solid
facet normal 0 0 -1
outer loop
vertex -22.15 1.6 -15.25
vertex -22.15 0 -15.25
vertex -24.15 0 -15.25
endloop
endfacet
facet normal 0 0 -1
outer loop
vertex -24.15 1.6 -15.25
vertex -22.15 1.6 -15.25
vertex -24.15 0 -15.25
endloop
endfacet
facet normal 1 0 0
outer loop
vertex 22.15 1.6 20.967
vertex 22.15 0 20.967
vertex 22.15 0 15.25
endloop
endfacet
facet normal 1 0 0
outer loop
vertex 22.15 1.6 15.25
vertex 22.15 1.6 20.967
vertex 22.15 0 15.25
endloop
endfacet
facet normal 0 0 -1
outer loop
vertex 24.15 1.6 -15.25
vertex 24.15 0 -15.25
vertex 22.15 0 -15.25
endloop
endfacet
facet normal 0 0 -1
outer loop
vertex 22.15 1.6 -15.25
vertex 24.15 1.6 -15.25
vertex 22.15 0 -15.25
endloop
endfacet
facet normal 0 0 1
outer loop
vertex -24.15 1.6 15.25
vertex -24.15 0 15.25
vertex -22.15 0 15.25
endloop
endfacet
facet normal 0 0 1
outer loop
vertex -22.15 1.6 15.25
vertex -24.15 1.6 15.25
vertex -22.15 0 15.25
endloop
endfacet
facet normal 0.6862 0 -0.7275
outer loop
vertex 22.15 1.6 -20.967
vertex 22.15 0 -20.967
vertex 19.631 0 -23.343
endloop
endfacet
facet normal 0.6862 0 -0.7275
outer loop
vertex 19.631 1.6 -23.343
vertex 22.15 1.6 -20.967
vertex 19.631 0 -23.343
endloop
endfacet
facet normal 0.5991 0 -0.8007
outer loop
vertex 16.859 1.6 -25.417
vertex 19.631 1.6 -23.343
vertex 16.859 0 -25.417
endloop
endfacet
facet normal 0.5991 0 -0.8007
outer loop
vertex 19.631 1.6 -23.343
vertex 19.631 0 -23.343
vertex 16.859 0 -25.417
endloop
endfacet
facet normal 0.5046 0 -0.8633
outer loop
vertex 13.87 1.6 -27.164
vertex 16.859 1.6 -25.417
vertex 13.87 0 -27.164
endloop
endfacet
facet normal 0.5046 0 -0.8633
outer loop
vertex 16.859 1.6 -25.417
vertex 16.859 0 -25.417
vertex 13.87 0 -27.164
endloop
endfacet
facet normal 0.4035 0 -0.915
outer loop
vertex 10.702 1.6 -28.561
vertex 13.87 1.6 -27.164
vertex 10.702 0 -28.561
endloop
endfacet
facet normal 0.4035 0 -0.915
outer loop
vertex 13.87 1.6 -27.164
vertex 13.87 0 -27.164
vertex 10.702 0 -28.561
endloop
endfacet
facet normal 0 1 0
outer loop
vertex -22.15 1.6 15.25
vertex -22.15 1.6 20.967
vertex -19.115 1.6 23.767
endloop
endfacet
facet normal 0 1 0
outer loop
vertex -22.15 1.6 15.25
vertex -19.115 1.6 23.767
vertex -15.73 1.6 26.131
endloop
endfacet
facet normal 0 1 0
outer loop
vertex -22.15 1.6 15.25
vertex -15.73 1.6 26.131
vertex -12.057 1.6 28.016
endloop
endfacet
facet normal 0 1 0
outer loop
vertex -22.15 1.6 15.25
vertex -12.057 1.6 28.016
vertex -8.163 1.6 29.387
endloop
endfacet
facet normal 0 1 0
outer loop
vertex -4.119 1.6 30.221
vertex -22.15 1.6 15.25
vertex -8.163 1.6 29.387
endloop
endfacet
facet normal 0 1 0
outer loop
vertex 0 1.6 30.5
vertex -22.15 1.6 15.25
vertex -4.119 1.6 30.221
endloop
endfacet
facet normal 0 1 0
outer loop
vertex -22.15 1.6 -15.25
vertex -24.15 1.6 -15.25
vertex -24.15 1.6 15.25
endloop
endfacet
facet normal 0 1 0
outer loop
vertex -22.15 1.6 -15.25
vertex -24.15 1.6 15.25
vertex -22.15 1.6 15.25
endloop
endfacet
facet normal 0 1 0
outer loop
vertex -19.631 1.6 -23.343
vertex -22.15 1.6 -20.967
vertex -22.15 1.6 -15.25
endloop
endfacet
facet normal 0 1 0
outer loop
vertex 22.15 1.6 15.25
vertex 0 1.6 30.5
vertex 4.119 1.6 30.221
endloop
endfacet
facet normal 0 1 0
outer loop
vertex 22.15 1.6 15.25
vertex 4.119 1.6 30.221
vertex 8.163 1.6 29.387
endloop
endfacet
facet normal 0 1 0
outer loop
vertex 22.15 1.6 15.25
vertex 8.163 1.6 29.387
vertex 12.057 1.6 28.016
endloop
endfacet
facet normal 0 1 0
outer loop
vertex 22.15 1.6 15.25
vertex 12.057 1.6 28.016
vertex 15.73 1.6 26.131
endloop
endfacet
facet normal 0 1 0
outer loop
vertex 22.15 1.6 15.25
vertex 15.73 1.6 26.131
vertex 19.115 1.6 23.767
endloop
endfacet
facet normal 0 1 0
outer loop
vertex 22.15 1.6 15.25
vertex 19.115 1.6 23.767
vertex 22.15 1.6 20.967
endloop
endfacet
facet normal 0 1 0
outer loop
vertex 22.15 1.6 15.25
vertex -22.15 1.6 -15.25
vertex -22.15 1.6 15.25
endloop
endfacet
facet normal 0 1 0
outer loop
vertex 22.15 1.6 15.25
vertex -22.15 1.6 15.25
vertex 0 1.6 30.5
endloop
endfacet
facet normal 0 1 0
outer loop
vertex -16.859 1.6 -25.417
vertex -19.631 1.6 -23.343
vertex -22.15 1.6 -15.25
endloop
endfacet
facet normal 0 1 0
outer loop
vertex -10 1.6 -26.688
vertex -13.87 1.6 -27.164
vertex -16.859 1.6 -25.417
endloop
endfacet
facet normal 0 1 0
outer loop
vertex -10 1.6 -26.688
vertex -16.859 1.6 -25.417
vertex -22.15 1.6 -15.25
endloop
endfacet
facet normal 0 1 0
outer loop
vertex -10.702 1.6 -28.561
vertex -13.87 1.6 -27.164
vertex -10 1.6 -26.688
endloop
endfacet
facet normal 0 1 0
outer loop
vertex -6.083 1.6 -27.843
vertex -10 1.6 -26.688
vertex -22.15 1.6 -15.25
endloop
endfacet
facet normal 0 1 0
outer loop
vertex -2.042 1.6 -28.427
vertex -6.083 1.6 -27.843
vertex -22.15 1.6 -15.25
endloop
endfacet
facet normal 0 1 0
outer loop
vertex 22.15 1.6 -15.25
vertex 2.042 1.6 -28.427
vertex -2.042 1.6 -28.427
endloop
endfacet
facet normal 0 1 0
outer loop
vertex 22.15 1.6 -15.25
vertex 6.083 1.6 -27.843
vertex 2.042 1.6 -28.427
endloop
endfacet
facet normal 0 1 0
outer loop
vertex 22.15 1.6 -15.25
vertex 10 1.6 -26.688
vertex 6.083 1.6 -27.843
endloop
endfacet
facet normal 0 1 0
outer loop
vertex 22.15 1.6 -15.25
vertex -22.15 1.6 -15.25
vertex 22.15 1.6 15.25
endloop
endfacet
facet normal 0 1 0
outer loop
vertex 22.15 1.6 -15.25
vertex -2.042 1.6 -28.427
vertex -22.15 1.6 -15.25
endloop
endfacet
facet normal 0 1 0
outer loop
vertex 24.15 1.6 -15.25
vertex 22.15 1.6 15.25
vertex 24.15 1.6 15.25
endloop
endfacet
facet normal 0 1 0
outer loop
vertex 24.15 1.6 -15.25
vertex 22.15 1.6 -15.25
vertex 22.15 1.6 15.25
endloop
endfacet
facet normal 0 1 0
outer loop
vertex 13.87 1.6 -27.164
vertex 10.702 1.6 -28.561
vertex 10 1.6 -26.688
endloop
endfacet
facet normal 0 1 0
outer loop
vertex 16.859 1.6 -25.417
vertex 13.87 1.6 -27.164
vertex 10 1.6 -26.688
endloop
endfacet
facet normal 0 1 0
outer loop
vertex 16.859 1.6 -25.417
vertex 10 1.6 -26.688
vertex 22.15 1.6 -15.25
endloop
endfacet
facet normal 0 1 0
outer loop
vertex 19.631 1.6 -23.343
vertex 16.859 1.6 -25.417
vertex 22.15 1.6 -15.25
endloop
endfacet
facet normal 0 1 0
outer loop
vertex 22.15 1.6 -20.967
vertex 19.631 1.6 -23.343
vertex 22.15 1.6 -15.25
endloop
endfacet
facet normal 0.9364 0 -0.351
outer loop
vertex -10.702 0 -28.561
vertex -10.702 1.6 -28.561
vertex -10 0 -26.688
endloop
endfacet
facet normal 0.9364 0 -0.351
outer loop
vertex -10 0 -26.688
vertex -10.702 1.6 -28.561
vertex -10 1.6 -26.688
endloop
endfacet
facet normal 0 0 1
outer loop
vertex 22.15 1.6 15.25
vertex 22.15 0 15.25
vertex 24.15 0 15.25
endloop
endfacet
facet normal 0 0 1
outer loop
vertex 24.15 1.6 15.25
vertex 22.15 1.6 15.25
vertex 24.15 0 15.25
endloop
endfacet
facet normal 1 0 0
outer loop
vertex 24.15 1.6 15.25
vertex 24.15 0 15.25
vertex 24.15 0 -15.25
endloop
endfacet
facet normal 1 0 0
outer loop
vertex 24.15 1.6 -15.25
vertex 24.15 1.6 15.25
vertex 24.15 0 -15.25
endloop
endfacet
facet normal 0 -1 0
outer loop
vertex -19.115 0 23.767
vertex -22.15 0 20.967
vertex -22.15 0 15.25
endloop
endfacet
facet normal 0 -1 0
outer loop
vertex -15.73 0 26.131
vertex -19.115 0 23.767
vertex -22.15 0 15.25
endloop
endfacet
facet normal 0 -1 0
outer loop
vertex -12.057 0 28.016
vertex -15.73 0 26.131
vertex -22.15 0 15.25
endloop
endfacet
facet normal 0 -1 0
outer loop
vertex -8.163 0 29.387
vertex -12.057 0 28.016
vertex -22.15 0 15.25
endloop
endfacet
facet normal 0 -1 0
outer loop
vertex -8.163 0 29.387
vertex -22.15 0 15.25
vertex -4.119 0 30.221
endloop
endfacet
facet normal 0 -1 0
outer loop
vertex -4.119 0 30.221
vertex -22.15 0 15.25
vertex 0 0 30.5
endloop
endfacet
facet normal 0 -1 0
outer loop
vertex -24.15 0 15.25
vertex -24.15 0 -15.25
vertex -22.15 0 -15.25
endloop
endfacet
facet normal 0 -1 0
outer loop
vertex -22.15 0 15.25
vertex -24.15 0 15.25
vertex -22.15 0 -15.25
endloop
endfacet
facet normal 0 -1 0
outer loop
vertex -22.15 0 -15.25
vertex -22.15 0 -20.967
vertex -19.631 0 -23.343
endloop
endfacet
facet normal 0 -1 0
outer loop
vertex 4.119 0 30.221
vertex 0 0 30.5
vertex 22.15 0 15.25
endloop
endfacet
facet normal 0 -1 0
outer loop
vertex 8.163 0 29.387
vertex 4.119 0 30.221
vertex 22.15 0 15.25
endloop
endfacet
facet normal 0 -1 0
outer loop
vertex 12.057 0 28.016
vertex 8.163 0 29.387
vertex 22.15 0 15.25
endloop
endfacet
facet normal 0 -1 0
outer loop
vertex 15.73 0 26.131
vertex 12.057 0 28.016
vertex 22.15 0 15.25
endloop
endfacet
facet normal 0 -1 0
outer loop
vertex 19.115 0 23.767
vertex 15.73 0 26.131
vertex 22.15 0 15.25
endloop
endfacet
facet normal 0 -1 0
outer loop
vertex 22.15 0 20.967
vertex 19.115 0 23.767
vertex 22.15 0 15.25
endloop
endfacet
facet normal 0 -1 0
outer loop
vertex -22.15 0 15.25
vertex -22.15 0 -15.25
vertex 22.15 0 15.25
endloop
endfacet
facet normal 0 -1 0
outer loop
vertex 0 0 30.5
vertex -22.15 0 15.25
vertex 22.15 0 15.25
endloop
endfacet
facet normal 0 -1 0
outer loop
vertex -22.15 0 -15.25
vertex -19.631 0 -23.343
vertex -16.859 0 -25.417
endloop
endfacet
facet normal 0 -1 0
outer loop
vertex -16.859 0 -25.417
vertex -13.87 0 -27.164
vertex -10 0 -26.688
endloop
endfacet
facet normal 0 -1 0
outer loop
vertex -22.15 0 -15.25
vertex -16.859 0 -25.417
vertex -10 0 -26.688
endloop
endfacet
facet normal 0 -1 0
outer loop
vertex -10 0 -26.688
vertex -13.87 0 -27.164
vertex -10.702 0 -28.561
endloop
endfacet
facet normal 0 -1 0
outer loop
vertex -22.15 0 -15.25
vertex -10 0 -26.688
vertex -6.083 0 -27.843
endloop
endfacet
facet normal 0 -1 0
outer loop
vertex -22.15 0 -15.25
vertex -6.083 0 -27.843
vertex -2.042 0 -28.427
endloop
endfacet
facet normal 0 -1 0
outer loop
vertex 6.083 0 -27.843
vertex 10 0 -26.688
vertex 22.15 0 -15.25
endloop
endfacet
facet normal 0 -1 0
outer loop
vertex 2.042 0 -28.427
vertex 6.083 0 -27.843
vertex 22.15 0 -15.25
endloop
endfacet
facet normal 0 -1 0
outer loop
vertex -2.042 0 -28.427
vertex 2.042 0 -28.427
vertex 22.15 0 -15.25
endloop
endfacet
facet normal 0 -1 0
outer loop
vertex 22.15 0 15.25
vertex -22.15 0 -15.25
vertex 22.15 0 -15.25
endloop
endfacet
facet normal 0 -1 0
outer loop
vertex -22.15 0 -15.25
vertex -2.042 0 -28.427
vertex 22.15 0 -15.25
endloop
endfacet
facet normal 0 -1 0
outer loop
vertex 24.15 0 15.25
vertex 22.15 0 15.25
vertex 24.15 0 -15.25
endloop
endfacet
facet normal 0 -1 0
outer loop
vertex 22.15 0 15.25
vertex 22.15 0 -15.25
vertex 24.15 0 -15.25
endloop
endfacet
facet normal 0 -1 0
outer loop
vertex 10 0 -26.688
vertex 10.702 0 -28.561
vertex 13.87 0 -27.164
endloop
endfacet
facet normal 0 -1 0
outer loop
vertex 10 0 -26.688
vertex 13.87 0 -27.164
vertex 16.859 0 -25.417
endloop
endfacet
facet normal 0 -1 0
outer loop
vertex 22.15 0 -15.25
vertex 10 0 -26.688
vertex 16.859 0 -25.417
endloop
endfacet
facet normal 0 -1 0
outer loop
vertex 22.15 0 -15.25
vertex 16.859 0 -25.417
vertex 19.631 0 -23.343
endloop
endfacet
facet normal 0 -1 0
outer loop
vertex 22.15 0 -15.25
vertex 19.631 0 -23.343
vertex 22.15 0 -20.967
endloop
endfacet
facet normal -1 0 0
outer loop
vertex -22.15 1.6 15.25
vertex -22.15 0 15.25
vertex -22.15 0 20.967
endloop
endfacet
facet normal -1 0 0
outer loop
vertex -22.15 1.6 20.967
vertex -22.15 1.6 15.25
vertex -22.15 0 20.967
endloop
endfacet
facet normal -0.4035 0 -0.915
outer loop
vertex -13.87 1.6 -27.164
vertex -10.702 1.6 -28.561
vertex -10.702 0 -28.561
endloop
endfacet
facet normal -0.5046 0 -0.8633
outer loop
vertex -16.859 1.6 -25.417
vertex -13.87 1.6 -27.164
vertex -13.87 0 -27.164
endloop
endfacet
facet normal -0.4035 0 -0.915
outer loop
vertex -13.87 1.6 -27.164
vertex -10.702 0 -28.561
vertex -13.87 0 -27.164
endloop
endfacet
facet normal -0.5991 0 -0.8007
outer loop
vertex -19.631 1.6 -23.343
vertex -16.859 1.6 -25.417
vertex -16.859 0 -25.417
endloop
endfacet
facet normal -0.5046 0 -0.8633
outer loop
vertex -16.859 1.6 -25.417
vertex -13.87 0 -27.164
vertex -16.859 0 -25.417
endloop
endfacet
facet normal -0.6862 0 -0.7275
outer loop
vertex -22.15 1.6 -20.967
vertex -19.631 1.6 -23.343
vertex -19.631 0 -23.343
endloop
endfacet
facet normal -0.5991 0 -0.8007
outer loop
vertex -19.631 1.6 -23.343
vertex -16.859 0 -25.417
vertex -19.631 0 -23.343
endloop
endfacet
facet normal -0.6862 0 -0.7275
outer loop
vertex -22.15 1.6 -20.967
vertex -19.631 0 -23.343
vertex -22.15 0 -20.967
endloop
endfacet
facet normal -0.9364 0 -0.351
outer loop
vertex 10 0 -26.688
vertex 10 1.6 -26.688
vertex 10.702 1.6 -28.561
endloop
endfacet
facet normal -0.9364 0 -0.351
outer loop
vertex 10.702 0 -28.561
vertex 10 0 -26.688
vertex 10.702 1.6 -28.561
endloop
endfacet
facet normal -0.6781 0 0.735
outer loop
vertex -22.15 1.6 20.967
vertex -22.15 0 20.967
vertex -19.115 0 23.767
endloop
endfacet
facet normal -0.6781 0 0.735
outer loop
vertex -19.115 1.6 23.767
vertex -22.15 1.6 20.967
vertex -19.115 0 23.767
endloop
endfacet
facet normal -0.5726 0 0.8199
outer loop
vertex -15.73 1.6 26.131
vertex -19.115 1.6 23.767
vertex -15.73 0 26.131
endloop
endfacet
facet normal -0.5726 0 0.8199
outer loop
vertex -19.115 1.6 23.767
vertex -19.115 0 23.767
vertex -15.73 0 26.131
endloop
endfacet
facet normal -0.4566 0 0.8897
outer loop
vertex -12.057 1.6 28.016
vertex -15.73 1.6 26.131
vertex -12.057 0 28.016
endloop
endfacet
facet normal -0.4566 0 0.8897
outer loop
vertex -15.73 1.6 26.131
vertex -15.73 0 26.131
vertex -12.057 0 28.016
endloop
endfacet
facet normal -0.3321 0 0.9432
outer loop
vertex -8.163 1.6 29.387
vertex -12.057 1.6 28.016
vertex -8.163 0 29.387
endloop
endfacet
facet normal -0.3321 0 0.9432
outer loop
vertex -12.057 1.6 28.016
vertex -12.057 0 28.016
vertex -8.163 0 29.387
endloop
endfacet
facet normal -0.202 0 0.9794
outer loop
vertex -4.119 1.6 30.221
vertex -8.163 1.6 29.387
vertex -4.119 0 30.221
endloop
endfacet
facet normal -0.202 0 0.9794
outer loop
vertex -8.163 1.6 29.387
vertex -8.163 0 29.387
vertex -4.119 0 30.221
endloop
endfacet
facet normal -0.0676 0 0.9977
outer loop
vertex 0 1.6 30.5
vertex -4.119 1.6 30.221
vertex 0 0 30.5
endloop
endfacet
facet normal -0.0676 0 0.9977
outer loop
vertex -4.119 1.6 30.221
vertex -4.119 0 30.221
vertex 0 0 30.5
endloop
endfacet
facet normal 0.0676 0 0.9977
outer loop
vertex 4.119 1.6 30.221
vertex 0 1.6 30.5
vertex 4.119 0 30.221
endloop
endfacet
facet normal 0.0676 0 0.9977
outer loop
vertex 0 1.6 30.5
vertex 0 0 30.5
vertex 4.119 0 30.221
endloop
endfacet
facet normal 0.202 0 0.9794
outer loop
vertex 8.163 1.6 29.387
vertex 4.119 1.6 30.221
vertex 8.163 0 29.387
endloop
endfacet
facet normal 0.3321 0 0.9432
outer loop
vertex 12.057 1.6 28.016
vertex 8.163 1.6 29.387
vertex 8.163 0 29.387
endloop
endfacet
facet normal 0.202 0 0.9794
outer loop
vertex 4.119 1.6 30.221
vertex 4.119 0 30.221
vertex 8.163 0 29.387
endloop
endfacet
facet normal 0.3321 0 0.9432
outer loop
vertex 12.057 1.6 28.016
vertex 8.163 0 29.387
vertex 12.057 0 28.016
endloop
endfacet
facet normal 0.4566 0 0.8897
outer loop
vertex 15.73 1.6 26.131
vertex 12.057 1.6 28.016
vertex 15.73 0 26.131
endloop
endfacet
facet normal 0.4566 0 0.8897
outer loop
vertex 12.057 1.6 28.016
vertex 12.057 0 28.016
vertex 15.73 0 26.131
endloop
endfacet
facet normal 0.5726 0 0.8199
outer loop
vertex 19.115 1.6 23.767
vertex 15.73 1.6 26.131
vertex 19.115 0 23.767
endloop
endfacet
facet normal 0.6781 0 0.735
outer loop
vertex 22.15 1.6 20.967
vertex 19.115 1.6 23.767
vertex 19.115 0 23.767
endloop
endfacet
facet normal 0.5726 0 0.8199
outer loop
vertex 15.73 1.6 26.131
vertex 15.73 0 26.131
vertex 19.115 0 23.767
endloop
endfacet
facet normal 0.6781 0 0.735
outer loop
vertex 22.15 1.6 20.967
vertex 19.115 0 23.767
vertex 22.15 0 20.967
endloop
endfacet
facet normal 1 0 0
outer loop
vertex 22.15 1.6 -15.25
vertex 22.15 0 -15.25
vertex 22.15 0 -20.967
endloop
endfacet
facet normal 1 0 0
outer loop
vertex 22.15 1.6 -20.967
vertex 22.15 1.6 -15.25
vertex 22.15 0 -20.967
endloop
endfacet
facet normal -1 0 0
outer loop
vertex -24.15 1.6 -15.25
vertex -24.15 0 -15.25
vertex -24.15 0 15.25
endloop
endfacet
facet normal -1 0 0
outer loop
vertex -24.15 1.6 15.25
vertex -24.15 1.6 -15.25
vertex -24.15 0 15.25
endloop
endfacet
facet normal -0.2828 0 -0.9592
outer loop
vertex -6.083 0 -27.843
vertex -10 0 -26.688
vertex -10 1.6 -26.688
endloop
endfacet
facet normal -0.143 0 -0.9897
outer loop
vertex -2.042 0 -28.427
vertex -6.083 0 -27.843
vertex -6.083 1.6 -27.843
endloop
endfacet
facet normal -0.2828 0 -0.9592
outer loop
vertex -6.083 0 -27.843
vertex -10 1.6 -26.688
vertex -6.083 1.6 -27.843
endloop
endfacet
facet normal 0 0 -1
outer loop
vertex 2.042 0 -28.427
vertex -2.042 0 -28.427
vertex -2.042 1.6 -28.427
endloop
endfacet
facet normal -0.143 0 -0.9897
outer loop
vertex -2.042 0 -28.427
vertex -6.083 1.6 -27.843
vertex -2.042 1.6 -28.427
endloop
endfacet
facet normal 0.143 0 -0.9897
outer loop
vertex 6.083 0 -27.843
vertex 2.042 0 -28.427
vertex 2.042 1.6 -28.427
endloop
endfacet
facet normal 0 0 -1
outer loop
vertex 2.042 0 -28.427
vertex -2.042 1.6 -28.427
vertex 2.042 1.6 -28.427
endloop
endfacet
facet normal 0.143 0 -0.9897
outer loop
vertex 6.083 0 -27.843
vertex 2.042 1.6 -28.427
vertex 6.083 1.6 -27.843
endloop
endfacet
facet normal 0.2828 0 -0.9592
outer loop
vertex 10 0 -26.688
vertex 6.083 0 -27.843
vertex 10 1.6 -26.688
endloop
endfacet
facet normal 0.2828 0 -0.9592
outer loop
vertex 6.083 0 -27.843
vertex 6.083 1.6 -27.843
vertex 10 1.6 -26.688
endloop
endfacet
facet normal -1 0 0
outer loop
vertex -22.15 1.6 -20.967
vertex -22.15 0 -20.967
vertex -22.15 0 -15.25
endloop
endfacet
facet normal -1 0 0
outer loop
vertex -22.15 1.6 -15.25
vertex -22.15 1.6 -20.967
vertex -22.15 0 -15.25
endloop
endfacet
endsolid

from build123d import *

# Parameters (mm, degrees)
BOSS_EXTRUDE1_DEPTH = 1.6
CUT_EXTRUDE1_DEPTH  = 10


with BuildPart() as part:
    # Sketch1 → Boss-Extrude1 (new body)
    with BuildSketch(Plane(origin=(0, 0, 0), x_dir=(1, 0, 0), z_dir=(0, 1, 0))):
        with BuildLine():
            Line((-24.15, 15.25), (-24.15, -15.25))
            Line((-24.15, -15.25), (-22.15, -15.25))
            Line((-22.15, -15.25), (-22.15, -20.967295963))
            ThreePointArc((-22.15, -20.967295963), (0, -30.5), (22.15, -20.967295963))
            Line((22.15, -20.967295963), (22.15, -15.25))
            Line((22.15, -15.25), (24.15, -15.25))
            Line((24.15, -15.25), (24.15, 15.25))
            Line((24.15, 15.25), (22.15, 15.25))
            Line((22.15, 15.25), (22.15, 20.967295963))
            ThreePointArc((22.15, 20.967295963), (0, 30.5), (-22.15, 20.967295963))
            Line((-22.15, 20.967295963), (-22.15, 15.25))
            Line((-22.15, 15.25), (-24.15, 15.25))
        make_face()
    extrude(amount=BOSS_EXTRUDE1_DEPTH)

    # Sketch2 → Cut-Extrude1 (cut)
    with BuildSketch(Plane(origin=(0, 1.6, 0), x_dir=(1, 0, 0), z_dir=(0, 1, 0))):
        with BuildLine():
            ThreePointArc((-10, 26.68801229), (0, 28.5), (10, 26.68801229))
            Line((10, 26.68801229), (10.701754386, 28.560855258))
            ThreePointArc((10.701754386, 28.560855258), (0, 30.5), (-10.701754386, 28.560855258))
            Line((-10.701754386, 28.560855258), (-10, 26.68801229))
        make_face()
    extrude(amount=-CUT_EXTRUDE1_DEPTH, mode=Mode.SUBTRACT)


solid = part.part
